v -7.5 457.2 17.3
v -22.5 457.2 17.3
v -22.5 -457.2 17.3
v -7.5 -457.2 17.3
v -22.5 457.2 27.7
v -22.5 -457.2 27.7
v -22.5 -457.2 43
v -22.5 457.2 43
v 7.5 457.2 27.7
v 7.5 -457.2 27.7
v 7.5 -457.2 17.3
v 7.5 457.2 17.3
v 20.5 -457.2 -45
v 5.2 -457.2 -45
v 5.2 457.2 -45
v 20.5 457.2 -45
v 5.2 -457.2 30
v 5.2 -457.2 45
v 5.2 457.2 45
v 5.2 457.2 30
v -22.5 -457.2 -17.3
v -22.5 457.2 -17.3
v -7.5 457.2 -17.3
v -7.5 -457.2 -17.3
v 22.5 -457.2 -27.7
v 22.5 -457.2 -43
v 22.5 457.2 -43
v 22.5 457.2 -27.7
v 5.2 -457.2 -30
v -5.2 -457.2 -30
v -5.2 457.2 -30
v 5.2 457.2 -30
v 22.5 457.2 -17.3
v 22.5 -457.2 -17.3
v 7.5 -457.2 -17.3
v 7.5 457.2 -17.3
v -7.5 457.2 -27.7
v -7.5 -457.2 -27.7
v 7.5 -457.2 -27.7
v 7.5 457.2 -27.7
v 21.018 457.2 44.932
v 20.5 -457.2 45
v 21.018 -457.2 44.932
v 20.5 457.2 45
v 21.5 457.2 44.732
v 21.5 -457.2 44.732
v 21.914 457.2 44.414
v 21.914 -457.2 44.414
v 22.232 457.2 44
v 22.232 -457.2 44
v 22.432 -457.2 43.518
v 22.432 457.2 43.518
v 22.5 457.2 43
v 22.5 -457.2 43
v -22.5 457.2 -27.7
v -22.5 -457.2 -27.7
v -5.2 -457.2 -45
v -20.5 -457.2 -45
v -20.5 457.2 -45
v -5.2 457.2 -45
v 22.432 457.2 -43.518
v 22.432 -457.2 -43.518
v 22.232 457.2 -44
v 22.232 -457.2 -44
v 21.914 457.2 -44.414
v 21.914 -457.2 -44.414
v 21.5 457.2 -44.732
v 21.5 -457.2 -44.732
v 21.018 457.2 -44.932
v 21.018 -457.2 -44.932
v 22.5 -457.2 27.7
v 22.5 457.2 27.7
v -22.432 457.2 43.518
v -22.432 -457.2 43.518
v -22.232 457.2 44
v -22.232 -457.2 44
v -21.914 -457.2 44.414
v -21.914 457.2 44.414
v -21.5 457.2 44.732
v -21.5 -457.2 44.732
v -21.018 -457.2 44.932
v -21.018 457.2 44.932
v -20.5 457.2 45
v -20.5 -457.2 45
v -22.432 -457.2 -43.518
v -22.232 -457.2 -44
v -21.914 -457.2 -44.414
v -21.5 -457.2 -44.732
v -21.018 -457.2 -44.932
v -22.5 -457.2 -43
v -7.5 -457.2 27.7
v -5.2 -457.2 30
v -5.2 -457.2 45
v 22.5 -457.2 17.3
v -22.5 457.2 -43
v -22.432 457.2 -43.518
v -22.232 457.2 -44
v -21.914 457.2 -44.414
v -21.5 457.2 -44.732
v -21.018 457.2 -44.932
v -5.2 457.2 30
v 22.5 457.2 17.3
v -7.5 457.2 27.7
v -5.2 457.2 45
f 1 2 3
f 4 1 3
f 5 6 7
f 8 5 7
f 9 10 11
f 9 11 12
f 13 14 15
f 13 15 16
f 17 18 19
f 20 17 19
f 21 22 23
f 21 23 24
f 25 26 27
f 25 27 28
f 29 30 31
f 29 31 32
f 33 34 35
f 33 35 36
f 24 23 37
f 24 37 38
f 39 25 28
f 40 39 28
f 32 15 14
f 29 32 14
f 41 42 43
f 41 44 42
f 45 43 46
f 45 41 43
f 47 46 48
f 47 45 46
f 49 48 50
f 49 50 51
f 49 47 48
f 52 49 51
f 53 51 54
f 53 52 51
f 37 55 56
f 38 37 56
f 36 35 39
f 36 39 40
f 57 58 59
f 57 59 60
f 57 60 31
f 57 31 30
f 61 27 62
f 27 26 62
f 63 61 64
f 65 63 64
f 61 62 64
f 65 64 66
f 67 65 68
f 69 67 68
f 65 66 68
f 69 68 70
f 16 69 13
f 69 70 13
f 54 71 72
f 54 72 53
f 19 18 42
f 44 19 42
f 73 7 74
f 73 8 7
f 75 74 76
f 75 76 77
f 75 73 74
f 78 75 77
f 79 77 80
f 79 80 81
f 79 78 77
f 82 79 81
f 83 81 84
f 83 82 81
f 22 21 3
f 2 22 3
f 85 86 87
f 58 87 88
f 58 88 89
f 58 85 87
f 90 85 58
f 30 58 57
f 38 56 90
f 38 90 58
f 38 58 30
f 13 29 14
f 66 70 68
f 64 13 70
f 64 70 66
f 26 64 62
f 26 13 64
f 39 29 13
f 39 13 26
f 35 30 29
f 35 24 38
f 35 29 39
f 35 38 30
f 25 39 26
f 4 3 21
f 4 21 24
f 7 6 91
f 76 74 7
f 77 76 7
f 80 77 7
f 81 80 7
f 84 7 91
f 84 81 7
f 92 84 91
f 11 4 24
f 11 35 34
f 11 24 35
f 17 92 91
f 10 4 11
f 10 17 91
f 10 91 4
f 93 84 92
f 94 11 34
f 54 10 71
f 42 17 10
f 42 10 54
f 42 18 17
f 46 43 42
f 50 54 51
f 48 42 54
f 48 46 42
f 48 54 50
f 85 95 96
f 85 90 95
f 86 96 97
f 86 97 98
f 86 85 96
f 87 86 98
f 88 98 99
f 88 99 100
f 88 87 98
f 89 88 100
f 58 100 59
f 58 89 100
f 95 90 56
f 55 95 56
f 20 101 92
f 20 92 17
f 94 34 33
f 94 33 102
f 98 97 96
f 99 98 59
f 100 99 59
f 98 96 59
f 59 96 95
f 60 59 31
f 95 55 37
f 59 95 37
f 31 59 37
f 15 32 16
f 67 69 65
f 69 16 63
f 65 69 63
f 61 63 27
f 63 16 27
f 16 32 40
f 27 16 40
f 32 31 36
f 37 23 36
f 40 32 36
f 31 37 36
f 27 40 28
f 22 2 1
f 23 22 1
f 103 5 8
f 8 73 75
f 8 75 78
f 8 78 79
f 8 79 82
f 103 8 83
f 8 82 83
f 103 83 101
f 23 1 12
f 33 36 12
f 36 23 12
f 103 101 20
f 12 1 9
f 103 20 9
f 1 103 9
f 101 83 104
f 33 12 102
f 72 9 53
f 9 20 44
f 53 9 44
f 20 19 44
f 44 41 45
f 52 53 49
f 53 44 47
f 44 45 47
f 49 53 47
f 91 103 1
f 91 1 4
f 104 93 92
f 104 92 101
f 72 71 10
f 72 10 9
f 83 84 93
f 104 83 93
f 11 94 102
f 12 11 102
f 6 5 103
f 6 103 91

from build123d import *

# Parameters (mm, degrees)
F0_W     = 45
F0_H     = 90
F1_DEPTH = 457.2
F2_W     = 914.4
F2_H     = 10.4
F3_DEPTH = 15
F4_W     = 914.4
F4_H     = 10.4
F5_DEPTH = 15
F6_W     = 10.4
F6_H     = 914.4
F7_DEPTH = 15
F8_W     = 10.4
F8_H     = 914.4
F9_DEPTH = 15
F10_R    = 2


with BuildPart() as f1:
    # F0 (on Front) → F1 (new body, symmetric)
    with BuildSketch(Plane.XZ):
        Rectangle(F0_W, F0_H)
    extrude(amount=F1_DEPTH, both=True)

    # F2 (on face) → F3 (cut)
    with BuildSketch(Plane.YZ.offset(22.5)):
        with Locations((0, 22.5)):
            Rectangle(F2_W, F2_H)
        with Locations((0, -22.5)):
            Rectangle(F2_W, F2_H)
    extrude(amount=-F3_DEPTH, mode=Mode.SUBTRACT)

    # F4 (on face) → F5 (cut)
    with BuildSketch(Plane(origin=(-22.5, 0, 0), x_dir=(0, -1, 0), z_dir=(-1, 0, 0))):
        with Locations((0, 22.5)):
            Rectangle(F4_W, F4_H)
        with Locations((0, -22.5)):
            Rectangle(F4_W, F4_H)
    extrude(amount=-F5_DEPTH, mode=Mode.SUBTRACT)

    # F6 (on face) → F7 (cut)
    with BuildSketch(Plane.XY.offset(45)):
        Rectangle(F6_W, F6_H)
    extrude(amount=-F7_DEPTH, mode=Mode.SUBTRACT)

    # F8 (on face) → F9 (cut)
    with BuildSketch(Plane(origin=(0, 0, -45), x_dir=(1, 0, 0), z_dir=(0, 0, -1))):
        Rectangle(F8_W, F8_H)
    extrude(amount=-F9_DEPTH, mode=Mode.SUBTRACT)

    # F10
    f10_edges = [f1.edges().sort_by_distance(p)[0] for p in [
        (22.5, 0, 45),
        (-22.5, 0, 45),
        (22.5, 0, -45),
        (-22.5, 0, -45),
    ]]
    fillet(f10_edges, radius=F10_R)


solid = f1.part
